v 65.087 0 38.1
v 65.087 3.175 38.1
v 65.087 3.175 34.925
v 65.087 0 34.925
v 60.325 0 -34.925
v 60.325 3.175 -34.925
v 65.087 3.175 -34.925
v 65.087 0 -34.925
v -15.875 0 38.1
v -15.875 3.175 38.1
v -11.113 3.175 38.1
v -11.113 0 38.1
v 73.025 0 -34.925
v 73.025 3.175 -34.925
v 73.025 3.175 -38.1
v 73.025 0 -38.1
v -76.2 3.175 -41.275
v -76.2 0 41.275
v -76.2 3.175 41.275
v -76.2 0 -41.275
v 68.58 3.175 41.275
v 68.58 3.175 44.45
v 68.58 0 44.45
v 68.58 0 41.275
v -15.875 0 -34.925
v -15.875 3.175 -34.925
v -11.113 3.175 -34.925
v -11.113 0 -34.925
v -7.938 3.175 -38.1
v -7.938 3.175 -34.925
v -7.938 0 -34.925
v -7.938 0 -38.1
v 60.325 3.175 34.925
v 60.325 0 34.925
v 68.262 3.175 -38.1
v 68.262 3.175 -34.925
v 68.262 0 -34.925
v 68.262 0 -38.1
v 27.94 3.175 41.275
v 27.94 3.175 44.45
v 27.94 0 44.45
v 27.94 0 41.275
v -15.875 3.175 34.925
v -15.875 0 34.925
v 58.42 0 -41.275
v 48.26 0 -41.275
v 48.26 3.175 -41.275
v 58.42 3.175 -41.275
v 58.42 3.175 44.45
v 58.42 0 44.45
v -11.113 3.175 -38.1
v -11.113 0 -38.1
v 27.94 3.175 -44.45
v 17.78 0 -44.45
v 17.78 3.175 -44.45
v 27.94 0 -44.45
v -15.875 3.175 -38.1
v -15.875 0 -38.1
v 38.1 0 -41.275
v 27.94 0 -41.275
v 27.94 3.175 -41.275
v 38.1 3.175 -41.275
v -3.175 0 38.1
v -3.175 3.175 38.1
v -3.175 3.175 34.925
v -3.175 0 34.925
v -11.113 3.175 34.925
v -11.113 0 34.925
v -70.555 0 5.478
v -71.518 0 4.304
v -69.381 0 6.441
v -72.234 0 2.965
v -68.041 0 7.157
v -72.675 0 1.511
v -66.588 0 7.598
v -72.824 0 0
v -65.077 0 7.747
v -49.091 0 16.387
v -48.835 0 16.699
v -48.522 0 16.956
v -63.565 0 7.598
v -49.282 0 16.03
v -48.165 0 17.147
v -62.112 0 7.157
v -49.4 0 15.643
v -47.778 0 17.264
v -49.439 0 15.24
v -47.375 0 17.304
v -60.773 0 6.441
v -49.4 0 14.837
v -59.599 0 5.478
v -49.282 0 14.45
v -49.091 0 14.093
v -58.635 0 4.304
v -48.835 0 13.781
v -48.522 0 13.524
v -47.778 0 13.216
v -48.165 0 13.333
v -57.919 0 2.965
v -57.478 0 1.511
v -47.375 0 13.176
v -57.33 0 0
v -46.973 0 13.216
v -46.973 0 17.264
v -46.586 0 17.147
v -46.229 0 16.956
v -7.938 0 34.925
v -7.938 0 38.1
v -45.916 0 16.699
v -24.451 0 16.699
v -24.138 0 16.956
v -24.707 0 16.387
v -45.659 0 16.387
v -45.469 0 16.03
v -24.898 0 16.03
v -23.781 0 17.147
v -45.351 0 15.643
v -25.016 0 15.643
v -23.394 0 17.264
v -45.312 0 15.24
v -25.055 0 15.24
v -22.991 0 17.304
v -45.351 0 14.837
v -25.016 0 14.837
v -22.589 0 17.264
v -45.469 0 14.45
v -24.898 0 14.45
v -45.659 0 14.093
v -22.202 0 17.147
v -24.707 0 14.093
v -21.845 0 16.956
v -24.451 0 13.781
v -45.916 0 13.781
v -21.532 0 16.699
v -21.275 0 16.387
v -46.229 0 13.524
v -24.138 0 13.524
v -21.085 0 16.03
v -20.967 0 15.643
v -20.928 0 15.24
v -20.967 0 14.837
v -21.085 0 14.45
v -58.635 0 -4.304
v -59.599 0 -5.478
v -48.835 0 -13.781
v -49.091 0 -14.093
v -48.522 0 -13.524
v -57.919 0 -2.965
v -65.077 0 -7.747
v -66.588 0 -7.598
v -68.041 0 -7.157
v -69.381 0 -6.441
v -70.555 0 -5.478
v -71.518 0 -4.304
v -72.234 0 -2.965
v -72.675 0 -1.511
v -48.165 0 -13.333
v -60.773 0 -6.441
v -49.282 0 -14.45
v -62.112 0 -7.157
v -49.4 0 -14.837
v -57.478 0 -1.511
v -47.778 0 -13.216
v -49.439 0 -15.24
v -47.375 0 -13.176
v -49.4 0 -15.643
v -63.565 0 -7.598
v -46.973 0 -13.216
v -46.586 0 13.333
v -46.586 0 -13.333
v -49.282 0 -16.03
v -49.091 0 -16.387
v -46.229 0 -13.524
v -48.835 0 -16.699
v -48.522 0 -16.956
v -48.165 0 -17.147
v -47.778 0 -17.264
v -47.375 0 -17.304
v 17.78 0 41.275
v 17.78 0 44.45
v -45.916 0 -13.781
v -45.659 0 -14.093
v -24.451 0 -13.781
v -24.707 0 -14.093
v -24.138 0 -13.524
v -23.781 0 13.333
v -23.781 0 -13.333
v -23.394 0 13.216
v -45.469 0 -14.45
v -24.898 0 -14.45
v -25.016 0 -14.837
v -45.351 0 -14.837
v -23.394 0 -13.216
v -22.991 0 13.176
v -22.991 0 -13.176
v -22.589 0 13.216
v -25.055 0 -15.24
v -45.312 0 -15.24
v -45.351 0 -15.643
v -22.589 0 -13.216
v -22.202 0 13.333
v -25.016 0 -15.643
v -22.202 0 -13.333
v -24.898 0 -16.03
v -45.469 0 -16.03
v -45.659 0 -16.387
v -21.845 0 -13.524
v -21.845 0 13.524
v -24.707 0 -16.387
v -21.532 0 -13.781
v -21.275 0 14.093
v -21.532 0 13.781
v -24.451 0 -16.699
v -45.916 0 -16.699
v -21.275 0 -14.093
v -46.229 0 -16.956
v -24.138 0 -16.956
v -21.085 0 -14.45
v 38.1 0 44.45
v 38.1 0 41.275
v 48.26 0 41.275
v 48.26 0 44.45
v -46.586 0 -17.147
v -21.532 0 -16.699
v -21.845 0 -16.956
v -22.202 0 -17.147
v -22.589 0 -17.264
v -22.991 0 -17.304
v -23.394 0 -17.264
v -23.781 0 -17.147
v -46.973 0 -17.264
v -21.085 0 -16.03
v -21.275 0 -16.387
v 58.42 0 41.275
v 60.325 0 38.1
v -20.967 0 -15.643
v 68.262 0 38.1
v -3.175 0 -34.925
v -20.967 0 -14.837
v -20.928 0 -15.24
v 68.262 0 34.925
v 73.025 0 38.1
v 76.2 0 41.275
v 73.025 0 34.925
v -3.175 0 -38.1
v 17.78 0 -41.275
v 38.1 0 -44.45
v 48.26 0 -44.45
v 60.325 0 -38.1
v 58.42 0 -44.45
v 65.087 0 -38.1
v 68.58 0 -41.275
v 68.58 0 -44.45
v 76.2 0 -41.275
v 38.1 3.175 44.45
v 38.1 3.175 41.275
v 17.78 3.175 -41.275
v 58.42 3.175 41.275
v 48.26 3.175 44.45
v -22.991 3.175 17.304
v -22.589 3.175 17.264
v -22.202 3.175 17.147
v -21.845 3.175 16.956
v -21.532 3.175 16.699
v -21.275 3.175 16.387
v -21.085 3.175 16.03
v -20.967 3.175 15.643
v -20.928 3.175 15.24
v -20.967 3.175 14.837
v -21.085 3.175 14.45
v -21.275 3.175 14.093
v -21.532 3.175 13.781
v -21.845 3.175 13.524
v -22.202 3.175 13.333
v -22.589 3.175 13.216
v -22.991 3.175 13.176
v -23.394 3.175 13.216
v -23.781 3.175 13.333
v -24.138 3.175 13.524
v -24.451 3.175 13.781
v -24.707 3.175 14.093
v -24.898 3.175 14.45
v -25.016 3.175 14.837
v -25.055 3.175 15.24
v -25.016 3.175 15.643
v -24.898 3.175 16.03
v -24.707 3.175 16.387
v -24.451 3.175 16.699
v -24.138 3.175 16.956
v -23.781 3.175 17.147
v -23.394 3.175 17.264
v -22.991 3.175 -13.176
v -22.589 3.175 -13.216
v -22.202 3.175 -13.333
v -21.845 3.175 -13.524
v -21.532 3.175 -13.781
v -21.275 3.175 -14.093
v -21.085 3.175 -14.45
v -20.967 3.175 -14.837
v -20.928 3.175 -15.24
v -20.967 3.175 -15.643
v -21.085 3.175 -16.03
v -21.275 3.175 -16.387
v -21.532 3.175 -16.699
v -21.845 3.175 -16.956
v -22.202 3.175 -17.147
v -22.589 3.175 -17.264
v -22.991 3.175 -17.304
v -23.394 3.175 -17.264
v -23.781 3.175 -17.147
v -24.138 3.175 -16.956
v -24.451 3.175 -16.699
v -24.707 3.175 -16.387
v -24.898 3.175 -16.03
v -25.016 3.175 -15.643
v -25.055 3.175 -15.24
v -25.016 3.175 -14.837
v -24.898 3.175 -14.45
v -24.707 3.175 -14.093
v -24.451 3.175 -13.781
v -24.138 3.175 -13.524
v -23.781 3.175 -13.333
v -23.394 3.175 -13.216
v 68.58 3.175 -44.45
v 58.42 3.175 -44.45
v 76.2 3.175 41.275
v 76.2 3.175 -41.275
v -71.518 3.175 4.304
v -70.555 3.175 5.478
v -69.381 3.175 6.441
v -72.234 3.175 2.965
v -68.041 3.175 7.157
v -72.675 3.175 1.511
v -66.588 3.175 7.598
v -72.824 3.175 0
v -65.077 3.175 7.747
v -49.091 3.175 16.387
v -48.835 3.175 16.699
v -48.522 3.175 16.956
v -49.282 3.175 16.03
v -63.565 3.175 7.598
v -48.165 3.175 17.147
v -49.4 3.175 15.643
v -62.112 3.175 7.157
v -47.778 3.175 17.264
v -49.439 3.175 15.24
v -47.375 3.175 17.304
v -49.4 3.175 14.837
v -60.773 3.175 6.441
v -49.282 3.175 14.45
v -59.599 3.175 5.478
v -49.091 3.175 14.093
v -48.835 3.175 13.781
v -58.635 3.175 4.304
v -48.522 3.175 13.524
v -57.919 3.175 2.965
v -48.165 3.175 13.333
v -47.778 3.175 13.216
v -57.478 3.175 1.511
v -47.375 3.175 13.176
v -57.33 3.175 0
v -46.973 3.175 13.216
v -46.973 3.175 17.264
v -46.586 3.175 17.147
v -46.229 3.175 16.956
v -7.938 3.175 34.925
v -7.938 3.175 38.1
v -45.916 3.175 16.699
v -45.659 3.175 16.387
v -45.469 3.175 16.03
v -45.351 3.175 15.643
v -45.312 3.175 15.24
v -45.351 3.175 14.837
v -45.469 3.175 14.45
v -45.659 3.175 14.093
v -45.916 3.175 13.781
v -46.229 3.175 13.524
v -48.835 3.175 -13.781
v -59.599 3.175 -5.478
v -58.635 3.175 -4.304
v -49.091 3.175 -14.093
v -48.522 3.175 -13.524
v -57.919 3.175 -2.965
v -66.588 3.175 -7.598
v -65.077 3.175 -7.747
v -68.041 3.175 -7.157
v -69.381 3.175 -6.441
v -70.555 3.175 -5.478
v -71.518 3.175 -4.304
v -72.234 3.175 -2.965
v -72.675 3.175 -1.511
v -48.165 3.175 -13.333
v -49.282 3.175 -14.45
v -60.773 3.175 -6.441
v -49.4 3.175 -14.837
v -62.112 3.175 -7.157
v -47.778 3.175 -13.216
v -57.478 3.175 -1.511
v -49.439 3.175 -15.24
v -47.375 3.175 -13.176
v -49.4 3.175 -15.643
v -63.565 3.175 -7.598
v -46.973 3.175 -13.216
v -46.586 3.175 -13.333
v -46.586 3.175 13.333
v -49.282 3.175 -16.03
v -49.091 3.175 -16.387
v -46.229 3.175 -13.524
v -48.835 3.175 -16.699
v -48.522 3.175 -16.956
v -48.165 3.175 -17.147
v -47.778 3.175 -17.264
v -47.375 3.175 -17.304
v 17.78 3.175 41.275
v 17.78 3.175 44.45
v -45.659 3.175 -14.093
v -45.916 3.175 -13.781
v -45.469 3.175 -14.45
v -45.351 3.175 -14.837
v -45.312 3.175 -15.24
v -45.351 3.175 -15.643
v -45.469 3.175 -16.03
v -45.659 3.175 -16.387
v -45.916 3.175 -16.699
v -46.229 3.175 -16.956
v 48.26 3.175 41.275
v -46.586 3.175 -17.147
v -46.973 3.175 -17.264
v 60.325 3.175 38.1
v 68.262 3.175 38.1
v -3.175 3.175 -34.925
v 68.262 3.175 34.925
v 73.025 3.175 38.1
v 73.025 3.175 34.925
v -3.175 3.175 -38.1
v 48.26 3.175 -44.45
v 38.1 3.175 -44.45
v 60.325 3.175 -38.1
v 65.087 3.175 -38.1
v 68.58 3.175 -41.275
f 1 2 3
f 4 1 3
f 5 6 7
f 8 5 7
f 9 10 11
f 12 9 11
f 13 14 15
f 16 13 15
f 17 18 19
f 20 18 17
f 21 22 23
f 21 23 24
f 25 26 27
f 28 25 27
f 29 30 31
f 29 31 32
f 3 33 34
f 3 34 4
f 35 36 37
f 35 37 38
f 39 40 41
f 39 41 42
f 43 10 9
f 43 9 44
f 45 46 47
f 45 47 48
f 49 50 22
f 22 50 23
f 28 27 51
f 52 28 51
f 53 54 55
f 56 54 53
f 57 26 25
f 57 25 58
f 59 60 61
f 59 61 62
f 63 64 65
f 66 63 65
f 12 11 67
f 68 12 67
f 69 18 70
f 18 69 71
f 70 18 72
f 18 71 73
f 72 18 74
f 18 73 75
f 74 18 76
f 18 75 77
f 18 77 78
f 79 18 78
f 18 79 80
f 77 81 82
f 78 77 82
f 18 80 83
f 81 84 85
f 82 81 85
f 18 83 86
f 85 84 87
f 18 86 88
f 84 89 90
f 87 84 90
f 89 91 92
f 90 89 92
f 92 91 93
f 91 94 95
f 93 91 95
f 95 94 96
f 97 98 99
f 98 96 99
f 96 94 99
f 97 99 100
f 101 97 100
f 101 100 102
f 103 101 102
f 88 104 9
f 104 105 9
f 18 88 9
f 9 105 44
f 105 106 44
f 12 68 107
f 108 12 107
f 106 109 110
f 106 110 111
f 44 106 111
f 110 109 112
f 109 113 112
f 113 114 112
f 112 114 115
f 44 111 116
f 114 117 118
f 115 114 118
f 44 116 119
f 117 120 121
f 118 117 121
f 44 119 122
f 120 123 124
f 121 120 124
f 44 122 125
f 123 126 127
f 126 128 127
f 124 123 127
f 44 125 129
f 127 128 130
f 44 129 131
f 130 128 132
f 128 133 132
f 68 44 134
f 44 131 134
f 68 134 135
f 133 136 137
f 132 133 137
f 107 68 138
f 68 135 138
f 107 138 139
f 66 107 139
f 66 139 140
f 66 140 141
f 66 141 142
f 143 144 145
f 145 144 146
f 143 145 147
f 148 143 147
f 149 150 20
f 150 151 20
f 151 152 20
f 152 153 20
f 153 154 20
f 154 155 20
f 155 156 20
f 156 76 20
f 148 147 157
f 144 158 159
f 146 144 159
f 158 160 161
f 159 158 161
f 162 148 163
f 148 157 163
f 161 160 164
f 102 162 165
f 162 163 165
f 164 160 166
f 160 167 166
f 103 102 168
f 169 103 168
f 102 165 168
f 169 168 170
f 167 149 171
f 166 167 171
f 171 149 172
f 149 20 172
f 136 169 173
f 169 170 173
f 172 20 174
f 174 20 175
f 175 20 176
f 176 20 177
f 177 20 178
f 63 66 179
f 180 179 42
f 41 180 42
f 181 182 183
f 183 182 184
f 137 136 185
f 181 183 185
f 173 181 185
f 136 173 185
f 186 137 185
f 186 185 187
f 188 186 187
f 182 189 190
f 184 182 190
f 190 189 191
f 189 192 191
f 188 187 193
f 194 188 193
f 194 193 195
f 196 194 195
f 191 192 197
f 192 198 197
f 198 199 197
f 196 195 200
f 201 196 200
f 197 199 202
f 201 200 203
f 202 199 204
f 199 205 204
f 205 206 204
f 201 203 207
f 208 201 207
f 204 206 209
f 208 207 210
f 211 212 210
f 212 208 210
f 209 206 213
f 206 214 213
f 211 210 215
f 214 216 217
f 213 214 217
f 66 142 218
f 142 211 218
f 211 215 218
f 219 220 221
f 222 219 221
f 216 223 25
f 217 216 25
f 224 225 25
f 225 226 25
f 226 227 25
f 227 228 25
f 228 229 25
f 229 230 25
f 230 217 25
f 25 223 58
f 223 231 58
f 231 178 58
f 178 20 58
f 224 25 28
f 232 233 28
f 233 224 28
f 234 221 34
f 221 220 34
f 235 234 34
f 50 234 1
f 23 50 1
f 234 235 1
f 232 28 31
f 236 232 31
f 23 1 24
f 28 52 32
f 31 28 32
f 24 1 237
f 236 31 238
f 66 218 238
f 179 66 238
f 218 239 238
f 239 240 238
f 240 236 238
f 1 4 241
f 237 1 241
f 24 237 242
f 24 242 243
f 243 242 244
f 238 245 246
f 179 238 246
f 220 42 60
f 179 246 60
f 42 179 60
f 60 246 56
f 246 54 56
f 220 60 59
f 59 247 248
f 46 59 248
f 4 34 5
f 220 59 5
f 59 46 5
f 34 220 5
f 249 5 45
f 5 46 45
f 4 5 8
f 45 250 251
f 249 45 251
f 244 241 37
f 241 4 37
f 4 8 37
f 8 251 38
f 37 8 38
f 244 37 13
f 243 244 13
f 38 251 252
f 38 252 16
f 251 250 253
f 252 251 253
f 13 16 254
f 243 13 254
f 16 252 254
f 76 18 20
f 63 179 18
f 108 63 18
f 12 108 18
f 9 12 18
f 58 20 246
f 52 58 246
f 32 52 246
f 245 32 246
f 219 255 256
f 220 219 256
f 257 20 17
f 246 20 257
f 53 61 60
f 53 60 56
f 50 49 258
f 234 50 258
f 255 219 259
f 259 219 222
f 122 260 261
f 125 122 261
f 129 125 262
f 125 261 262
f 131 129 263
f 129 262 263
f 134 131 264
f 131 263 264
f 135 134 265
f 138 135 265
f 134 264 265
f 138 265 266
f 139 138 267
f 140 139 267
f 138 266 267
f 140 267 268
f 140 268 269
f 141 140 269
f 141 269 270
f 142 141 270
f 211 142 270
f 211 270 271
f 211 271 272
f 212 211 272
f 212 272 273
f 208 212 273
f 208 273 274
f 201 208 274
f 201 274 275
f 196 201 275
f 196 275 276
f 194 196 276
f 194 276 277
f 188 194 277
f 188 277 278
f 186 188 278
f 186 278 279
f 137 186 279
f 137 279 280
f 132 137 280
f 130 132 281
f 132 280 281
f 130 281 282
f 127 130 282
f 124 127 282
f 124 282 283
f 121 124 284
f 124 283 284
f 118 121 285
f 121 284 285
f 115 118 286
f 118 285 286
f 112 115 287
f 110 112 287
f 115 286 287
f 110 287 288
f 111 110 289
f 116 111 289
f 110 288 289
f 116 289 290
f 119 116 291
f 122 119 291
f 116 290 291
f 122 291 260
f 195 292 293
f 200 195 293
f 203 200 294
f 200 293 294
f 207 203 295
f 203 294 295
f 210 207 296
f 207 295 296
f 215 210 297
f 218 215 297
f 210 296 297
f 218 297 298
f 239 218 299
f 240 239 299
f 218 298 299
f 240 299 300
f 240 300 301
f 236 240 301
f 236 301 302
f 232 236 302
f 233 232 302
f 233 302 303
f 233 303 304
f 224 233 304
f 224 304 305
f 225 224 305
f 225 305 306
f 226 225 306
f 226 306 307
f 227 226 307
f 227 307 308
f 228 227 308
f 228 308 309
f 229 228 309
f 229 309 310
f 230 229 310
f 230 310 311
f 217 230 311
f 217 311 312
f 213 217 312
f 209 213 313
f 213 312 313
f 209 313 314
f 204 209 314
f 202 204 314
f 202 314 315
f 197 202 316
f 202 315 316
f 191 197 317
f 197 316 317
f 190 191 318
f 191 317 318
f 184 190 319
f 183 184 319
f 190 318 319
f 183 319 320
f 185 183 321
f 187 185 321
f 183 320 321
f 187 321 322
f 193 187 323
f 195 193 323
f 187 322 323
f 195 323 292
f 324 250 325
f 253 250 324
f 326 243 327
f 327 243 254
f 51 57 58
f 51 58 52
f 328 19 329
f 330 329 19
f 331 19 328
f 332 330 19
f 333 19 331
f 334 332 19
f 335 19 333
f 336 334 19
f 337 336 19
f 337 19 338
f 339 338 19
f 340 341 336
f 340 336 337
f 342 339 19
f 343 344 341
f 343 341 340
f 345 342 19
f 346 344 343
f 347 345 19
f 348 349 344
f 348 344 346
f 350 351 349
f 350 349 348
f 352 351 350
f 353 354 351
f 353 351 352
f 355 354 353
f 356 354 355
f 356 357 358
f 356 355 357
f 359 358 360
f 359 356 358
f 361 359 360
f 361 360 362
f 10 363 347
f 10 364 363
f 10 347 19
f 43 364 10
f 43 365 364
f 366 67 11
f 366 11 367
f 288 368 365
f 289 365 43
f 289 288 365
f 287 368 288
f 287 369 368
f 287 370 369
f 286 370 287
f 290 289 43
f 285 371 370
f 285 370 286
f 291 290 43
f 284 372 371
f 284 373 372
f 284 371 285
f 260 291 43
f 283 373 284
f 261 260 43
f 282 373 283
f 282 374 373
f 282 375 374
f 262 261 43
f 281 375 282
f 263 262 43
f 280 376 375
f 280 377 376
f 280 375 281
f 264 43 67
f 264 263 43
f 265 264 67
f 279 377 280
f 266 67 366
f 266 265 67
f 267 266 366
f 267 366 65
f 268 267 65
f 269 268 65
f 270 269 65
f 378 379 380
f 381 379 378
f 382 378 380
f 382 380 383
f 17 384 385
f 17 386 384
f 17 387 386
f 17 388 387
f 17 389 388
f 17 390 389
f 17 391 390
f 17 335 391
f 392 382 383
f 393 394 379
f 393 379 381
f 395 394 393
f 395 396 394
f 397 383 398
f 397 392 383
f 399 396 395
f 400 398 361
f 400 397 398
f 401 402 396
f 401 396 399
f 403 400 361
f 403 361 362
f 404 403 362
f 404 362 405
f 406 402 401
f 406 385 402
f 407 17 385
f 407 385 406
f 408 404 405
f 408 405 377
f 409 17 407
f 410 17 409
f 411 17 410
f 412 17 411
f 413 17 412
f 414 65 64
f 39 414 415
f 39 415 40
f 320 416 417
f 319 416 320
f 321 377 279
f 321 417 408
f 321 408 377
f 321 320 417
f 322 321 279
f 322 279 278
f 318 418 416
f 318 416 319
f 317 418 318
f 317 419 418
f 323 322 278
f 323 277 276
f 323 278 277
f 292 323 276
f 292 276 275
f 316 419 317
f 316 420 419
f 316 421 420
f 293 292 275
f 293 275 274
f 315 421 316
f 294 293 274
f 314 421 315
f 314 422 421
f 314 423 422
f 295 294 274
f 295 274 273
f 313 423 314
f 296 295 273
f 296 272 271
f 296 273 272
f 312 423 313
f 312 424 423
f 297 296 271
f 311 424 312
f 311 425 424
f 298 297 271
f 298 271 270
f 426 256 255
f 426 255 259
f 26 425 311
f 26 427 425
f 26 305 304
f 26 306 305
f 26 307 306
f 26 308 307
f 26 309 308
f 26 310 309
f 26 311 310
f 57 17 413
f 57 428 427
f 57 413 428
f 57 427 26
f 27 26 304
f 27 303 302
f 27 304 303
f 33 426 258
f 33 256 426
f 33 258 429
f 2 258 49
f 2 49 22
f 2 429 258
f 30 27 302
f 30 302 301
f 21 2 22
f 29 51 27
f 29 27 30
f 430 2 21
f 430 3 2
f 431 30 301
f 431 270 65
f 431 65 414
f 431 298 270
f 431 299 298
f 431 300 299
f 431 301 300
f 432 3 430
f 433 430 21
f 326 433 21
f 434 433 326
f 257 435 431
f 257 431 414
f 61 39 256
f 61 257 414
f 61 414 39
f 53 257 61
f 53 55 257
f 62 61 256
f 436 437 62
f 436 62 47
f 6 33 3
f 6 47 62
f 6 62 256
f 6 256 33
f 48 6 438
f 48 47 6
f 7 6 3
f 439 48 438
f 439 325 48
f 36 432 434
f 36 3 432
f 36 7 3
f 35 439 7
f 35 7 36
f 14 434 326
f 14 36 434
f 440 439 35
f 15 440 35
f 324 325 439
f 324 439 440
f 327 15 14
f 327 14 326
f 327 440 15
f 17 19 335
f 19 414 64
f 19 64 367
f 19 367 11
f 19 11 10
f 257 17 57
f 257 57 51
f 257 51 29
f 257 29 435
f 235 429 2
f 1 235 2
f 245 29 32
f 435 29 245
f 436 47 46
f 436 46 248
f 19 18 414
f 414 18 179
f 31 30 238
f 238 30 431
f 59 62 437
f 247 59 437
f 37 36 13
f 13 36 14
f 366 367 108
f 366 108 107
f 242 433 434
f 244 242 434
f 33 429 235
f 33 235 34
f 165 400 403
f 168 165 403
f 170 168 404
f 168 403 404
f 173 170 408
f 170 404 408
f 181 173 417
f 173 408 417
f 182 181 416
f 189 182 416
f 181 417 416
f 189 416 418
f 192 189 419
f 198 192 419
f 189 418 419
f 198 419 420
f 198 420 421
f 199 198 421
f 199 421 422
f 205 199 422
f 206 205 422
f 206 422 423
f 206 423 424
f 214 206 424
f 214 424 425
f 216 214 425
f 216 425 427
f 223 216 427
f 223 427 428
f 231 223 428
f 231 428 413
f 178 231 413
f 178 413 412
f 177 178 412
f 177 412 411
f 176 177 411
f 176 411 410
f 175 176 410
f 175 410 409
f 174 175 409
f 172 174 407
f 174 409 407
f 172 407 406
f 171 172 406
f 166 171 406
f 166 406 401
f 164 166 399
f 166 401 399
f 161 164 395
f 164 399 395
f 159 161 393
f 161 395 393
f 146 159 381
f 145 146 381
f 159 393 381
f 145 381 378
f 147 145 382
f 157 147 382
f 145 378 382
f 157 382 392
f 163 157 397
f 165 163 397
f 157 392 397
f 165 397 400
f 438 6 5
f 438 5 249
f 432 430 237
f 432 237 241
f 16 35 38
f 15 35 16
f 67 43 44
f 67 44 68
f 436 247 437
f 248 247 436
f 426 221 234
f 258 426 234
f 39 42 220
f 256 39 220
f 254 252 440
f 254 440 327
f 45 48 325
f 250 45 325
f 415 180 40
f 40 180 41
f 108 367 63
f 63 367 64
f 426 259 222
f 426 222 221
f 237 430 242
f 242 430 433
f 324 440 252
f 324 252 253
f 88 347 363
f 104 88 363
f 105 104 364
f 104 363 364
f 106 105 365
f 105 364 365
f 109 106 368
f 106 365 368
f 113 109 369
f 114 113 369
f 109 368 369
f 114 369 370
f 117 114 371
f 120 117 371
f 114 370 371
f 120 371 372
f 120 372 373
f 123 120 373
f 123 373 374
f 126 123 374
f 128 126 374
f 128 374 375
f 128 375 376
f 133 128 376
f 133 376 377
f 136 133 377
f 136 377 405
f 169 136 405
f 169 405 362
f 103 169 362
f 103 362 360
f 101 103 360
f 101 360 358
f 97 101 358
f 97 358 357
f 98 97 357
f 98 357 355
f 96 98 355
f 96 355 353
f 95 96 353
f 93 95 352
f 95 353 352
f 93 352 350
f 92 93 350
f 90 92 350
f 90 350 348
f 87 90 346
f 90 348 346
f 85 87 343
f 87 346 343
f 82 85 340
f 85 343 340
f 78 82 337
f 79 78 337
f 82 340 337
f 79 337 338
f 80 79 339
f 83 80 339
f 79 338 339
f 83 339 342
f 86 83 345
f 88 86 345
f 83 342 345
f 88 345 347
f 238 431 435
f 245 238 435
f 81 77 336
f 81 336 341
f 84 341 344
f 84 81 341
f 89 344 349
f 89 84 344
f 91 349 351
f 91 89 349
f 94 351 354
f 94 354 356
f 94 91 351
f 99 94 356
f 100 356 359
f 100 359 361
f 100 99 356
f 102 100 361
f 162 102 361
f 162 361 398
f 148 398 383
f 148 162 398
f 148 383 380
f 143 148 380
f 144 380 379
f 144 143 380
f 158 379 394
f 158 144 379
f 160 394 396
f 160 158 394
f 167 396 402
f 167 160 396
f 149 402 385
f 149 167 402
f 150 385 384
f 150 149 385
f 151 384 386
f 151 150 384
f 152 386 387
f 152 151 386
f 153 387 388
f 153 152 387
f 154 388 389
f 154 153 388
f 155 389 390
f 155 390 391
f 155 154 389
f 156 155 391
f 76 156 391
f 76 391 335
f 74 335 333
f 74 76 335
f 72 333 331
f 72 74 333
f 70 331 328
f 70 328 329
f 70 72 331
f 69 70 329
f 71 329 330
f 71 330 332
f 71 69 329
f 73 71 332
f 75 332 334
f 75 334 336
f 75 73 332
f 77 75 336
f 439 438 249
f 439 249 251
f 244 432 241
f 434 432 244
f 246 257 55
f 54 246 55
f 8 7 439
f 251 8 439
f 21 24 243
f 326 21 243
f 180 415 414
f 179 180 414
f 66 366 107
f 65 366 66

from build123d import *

# Parameters (mm, degrees)
SKETCH1_R                   = 7.747
BOSS_EXTRUDE1_DEPTH         = 3.175
SKETCH2_R                   = 2.06375
CASTER_MOUNTING_HOLES_DEPTH = 89.274136218
SKETCH3_W                   = 4.7625
SKETCH3_H                   = 3.175
CUT_EXTRUDE1_DEPTH          = 89.274136218
LPATTERN1_COUNT             = 2
LPATTERN1_PITCH             = 76.2
LPATTERN1_COUNT_DIR2        = 2
LPATTERN1_PITCH_DIR2        = 73.025


with BuildPart() as part:
    # Sketch1 → Boss-Extrude1 (new body)
    with BuildSketch(Plane(origin=(0, 0, 0), x_dir=(1, 0, 0), z_dir=(0, 1, 0))):
        Polygon((27.94, -41.275), (38.1, -41.275), (38.1, -44.45), (48.26, -44.45), (48.26, -41.275), (58.42, -41.275), (58.42, -44.45), (68.58, -44.45), (68.58, -41.275), (76.2, -41.275), (76.2, 41.275), (68.58, 41.275), (68.58, 44.45), (58.42, 44.45), (58.42, 41.275), (48.26, 41.275), (48.26, 44.45), (38.1, 44.45), (38.1, 41.275), (27.94, 41.275), (27.94, 44.45), (17.78, 44.45), (17.78, 41.275), (-76.2, 41.275), (-76.2, -41.275), (17.78, -41.275), (17.78, -44.45), (27.94, -44.45), align=None)
        with Locations((-65.076590574, 0)):
            Circle(SKETCH1_R, mode=Mode.SUBTRACT)
    extrude(amount=BOSS_EXTRUDE1_DEPTH)

    # Sketch2 → Caster Mounting Holes (cut, through all)
    with BuildSketch(Plane(origin=(0, 3.175, 0), x_dir=(1, 0, 0), z_dir=(0, 1, 0))):
        with Locations((-47.3754273, 15.24)):
            Circle(SKETCH2_R)
        with Locations((-22.9914273, 15.24)):
            Circle(SKETCH2_R)
        with Locations((-22.9914273, -15.24)):
            Circle(SKETCH2_R)
        with Locations((-47.3754273, -15.24)):
            Circle(SKETCH2_R)
    extrude(amount=-CASTER_MOUNTING_HOLES_DEPTH, mode=Mode.SUBTRACT)

    # Sketch3 → Cut-Extrude1 (cut, through all)
    with BuildSketch(Plane(origin=(0, 3.175, 0), x_dir=(1, 0, 0), z_dir=(0, 1, 0))):
        with Locations((62.70625, 36.5125)):
            Rectangle(SKETCH3_W, SKETCH3_H)
        with Locations((70.64375, 36.5125)):
            Rectangle(SKETCH3_W, SKETCH3_H)
    cut_extrude1 = extrude(amount=-CUT_EXTRUDE1_DEPTH, mode=Mode.SUBTRACT)

    # LPattern1: Cut-Extrude1 2 × 2
    with Locations(*[(-i * LPATTERN1_PITCH, 0, j * LPATTERN1_PITCH_DIR2) for i in range(LPATTERN1_COUNT) for j in range(LPATTERN1_COUNT_DIR2) if (i, j) != (0, 0)]):
        add(cut_extrude1, mode=Mode.SUBTRACT)


solid = part.part
